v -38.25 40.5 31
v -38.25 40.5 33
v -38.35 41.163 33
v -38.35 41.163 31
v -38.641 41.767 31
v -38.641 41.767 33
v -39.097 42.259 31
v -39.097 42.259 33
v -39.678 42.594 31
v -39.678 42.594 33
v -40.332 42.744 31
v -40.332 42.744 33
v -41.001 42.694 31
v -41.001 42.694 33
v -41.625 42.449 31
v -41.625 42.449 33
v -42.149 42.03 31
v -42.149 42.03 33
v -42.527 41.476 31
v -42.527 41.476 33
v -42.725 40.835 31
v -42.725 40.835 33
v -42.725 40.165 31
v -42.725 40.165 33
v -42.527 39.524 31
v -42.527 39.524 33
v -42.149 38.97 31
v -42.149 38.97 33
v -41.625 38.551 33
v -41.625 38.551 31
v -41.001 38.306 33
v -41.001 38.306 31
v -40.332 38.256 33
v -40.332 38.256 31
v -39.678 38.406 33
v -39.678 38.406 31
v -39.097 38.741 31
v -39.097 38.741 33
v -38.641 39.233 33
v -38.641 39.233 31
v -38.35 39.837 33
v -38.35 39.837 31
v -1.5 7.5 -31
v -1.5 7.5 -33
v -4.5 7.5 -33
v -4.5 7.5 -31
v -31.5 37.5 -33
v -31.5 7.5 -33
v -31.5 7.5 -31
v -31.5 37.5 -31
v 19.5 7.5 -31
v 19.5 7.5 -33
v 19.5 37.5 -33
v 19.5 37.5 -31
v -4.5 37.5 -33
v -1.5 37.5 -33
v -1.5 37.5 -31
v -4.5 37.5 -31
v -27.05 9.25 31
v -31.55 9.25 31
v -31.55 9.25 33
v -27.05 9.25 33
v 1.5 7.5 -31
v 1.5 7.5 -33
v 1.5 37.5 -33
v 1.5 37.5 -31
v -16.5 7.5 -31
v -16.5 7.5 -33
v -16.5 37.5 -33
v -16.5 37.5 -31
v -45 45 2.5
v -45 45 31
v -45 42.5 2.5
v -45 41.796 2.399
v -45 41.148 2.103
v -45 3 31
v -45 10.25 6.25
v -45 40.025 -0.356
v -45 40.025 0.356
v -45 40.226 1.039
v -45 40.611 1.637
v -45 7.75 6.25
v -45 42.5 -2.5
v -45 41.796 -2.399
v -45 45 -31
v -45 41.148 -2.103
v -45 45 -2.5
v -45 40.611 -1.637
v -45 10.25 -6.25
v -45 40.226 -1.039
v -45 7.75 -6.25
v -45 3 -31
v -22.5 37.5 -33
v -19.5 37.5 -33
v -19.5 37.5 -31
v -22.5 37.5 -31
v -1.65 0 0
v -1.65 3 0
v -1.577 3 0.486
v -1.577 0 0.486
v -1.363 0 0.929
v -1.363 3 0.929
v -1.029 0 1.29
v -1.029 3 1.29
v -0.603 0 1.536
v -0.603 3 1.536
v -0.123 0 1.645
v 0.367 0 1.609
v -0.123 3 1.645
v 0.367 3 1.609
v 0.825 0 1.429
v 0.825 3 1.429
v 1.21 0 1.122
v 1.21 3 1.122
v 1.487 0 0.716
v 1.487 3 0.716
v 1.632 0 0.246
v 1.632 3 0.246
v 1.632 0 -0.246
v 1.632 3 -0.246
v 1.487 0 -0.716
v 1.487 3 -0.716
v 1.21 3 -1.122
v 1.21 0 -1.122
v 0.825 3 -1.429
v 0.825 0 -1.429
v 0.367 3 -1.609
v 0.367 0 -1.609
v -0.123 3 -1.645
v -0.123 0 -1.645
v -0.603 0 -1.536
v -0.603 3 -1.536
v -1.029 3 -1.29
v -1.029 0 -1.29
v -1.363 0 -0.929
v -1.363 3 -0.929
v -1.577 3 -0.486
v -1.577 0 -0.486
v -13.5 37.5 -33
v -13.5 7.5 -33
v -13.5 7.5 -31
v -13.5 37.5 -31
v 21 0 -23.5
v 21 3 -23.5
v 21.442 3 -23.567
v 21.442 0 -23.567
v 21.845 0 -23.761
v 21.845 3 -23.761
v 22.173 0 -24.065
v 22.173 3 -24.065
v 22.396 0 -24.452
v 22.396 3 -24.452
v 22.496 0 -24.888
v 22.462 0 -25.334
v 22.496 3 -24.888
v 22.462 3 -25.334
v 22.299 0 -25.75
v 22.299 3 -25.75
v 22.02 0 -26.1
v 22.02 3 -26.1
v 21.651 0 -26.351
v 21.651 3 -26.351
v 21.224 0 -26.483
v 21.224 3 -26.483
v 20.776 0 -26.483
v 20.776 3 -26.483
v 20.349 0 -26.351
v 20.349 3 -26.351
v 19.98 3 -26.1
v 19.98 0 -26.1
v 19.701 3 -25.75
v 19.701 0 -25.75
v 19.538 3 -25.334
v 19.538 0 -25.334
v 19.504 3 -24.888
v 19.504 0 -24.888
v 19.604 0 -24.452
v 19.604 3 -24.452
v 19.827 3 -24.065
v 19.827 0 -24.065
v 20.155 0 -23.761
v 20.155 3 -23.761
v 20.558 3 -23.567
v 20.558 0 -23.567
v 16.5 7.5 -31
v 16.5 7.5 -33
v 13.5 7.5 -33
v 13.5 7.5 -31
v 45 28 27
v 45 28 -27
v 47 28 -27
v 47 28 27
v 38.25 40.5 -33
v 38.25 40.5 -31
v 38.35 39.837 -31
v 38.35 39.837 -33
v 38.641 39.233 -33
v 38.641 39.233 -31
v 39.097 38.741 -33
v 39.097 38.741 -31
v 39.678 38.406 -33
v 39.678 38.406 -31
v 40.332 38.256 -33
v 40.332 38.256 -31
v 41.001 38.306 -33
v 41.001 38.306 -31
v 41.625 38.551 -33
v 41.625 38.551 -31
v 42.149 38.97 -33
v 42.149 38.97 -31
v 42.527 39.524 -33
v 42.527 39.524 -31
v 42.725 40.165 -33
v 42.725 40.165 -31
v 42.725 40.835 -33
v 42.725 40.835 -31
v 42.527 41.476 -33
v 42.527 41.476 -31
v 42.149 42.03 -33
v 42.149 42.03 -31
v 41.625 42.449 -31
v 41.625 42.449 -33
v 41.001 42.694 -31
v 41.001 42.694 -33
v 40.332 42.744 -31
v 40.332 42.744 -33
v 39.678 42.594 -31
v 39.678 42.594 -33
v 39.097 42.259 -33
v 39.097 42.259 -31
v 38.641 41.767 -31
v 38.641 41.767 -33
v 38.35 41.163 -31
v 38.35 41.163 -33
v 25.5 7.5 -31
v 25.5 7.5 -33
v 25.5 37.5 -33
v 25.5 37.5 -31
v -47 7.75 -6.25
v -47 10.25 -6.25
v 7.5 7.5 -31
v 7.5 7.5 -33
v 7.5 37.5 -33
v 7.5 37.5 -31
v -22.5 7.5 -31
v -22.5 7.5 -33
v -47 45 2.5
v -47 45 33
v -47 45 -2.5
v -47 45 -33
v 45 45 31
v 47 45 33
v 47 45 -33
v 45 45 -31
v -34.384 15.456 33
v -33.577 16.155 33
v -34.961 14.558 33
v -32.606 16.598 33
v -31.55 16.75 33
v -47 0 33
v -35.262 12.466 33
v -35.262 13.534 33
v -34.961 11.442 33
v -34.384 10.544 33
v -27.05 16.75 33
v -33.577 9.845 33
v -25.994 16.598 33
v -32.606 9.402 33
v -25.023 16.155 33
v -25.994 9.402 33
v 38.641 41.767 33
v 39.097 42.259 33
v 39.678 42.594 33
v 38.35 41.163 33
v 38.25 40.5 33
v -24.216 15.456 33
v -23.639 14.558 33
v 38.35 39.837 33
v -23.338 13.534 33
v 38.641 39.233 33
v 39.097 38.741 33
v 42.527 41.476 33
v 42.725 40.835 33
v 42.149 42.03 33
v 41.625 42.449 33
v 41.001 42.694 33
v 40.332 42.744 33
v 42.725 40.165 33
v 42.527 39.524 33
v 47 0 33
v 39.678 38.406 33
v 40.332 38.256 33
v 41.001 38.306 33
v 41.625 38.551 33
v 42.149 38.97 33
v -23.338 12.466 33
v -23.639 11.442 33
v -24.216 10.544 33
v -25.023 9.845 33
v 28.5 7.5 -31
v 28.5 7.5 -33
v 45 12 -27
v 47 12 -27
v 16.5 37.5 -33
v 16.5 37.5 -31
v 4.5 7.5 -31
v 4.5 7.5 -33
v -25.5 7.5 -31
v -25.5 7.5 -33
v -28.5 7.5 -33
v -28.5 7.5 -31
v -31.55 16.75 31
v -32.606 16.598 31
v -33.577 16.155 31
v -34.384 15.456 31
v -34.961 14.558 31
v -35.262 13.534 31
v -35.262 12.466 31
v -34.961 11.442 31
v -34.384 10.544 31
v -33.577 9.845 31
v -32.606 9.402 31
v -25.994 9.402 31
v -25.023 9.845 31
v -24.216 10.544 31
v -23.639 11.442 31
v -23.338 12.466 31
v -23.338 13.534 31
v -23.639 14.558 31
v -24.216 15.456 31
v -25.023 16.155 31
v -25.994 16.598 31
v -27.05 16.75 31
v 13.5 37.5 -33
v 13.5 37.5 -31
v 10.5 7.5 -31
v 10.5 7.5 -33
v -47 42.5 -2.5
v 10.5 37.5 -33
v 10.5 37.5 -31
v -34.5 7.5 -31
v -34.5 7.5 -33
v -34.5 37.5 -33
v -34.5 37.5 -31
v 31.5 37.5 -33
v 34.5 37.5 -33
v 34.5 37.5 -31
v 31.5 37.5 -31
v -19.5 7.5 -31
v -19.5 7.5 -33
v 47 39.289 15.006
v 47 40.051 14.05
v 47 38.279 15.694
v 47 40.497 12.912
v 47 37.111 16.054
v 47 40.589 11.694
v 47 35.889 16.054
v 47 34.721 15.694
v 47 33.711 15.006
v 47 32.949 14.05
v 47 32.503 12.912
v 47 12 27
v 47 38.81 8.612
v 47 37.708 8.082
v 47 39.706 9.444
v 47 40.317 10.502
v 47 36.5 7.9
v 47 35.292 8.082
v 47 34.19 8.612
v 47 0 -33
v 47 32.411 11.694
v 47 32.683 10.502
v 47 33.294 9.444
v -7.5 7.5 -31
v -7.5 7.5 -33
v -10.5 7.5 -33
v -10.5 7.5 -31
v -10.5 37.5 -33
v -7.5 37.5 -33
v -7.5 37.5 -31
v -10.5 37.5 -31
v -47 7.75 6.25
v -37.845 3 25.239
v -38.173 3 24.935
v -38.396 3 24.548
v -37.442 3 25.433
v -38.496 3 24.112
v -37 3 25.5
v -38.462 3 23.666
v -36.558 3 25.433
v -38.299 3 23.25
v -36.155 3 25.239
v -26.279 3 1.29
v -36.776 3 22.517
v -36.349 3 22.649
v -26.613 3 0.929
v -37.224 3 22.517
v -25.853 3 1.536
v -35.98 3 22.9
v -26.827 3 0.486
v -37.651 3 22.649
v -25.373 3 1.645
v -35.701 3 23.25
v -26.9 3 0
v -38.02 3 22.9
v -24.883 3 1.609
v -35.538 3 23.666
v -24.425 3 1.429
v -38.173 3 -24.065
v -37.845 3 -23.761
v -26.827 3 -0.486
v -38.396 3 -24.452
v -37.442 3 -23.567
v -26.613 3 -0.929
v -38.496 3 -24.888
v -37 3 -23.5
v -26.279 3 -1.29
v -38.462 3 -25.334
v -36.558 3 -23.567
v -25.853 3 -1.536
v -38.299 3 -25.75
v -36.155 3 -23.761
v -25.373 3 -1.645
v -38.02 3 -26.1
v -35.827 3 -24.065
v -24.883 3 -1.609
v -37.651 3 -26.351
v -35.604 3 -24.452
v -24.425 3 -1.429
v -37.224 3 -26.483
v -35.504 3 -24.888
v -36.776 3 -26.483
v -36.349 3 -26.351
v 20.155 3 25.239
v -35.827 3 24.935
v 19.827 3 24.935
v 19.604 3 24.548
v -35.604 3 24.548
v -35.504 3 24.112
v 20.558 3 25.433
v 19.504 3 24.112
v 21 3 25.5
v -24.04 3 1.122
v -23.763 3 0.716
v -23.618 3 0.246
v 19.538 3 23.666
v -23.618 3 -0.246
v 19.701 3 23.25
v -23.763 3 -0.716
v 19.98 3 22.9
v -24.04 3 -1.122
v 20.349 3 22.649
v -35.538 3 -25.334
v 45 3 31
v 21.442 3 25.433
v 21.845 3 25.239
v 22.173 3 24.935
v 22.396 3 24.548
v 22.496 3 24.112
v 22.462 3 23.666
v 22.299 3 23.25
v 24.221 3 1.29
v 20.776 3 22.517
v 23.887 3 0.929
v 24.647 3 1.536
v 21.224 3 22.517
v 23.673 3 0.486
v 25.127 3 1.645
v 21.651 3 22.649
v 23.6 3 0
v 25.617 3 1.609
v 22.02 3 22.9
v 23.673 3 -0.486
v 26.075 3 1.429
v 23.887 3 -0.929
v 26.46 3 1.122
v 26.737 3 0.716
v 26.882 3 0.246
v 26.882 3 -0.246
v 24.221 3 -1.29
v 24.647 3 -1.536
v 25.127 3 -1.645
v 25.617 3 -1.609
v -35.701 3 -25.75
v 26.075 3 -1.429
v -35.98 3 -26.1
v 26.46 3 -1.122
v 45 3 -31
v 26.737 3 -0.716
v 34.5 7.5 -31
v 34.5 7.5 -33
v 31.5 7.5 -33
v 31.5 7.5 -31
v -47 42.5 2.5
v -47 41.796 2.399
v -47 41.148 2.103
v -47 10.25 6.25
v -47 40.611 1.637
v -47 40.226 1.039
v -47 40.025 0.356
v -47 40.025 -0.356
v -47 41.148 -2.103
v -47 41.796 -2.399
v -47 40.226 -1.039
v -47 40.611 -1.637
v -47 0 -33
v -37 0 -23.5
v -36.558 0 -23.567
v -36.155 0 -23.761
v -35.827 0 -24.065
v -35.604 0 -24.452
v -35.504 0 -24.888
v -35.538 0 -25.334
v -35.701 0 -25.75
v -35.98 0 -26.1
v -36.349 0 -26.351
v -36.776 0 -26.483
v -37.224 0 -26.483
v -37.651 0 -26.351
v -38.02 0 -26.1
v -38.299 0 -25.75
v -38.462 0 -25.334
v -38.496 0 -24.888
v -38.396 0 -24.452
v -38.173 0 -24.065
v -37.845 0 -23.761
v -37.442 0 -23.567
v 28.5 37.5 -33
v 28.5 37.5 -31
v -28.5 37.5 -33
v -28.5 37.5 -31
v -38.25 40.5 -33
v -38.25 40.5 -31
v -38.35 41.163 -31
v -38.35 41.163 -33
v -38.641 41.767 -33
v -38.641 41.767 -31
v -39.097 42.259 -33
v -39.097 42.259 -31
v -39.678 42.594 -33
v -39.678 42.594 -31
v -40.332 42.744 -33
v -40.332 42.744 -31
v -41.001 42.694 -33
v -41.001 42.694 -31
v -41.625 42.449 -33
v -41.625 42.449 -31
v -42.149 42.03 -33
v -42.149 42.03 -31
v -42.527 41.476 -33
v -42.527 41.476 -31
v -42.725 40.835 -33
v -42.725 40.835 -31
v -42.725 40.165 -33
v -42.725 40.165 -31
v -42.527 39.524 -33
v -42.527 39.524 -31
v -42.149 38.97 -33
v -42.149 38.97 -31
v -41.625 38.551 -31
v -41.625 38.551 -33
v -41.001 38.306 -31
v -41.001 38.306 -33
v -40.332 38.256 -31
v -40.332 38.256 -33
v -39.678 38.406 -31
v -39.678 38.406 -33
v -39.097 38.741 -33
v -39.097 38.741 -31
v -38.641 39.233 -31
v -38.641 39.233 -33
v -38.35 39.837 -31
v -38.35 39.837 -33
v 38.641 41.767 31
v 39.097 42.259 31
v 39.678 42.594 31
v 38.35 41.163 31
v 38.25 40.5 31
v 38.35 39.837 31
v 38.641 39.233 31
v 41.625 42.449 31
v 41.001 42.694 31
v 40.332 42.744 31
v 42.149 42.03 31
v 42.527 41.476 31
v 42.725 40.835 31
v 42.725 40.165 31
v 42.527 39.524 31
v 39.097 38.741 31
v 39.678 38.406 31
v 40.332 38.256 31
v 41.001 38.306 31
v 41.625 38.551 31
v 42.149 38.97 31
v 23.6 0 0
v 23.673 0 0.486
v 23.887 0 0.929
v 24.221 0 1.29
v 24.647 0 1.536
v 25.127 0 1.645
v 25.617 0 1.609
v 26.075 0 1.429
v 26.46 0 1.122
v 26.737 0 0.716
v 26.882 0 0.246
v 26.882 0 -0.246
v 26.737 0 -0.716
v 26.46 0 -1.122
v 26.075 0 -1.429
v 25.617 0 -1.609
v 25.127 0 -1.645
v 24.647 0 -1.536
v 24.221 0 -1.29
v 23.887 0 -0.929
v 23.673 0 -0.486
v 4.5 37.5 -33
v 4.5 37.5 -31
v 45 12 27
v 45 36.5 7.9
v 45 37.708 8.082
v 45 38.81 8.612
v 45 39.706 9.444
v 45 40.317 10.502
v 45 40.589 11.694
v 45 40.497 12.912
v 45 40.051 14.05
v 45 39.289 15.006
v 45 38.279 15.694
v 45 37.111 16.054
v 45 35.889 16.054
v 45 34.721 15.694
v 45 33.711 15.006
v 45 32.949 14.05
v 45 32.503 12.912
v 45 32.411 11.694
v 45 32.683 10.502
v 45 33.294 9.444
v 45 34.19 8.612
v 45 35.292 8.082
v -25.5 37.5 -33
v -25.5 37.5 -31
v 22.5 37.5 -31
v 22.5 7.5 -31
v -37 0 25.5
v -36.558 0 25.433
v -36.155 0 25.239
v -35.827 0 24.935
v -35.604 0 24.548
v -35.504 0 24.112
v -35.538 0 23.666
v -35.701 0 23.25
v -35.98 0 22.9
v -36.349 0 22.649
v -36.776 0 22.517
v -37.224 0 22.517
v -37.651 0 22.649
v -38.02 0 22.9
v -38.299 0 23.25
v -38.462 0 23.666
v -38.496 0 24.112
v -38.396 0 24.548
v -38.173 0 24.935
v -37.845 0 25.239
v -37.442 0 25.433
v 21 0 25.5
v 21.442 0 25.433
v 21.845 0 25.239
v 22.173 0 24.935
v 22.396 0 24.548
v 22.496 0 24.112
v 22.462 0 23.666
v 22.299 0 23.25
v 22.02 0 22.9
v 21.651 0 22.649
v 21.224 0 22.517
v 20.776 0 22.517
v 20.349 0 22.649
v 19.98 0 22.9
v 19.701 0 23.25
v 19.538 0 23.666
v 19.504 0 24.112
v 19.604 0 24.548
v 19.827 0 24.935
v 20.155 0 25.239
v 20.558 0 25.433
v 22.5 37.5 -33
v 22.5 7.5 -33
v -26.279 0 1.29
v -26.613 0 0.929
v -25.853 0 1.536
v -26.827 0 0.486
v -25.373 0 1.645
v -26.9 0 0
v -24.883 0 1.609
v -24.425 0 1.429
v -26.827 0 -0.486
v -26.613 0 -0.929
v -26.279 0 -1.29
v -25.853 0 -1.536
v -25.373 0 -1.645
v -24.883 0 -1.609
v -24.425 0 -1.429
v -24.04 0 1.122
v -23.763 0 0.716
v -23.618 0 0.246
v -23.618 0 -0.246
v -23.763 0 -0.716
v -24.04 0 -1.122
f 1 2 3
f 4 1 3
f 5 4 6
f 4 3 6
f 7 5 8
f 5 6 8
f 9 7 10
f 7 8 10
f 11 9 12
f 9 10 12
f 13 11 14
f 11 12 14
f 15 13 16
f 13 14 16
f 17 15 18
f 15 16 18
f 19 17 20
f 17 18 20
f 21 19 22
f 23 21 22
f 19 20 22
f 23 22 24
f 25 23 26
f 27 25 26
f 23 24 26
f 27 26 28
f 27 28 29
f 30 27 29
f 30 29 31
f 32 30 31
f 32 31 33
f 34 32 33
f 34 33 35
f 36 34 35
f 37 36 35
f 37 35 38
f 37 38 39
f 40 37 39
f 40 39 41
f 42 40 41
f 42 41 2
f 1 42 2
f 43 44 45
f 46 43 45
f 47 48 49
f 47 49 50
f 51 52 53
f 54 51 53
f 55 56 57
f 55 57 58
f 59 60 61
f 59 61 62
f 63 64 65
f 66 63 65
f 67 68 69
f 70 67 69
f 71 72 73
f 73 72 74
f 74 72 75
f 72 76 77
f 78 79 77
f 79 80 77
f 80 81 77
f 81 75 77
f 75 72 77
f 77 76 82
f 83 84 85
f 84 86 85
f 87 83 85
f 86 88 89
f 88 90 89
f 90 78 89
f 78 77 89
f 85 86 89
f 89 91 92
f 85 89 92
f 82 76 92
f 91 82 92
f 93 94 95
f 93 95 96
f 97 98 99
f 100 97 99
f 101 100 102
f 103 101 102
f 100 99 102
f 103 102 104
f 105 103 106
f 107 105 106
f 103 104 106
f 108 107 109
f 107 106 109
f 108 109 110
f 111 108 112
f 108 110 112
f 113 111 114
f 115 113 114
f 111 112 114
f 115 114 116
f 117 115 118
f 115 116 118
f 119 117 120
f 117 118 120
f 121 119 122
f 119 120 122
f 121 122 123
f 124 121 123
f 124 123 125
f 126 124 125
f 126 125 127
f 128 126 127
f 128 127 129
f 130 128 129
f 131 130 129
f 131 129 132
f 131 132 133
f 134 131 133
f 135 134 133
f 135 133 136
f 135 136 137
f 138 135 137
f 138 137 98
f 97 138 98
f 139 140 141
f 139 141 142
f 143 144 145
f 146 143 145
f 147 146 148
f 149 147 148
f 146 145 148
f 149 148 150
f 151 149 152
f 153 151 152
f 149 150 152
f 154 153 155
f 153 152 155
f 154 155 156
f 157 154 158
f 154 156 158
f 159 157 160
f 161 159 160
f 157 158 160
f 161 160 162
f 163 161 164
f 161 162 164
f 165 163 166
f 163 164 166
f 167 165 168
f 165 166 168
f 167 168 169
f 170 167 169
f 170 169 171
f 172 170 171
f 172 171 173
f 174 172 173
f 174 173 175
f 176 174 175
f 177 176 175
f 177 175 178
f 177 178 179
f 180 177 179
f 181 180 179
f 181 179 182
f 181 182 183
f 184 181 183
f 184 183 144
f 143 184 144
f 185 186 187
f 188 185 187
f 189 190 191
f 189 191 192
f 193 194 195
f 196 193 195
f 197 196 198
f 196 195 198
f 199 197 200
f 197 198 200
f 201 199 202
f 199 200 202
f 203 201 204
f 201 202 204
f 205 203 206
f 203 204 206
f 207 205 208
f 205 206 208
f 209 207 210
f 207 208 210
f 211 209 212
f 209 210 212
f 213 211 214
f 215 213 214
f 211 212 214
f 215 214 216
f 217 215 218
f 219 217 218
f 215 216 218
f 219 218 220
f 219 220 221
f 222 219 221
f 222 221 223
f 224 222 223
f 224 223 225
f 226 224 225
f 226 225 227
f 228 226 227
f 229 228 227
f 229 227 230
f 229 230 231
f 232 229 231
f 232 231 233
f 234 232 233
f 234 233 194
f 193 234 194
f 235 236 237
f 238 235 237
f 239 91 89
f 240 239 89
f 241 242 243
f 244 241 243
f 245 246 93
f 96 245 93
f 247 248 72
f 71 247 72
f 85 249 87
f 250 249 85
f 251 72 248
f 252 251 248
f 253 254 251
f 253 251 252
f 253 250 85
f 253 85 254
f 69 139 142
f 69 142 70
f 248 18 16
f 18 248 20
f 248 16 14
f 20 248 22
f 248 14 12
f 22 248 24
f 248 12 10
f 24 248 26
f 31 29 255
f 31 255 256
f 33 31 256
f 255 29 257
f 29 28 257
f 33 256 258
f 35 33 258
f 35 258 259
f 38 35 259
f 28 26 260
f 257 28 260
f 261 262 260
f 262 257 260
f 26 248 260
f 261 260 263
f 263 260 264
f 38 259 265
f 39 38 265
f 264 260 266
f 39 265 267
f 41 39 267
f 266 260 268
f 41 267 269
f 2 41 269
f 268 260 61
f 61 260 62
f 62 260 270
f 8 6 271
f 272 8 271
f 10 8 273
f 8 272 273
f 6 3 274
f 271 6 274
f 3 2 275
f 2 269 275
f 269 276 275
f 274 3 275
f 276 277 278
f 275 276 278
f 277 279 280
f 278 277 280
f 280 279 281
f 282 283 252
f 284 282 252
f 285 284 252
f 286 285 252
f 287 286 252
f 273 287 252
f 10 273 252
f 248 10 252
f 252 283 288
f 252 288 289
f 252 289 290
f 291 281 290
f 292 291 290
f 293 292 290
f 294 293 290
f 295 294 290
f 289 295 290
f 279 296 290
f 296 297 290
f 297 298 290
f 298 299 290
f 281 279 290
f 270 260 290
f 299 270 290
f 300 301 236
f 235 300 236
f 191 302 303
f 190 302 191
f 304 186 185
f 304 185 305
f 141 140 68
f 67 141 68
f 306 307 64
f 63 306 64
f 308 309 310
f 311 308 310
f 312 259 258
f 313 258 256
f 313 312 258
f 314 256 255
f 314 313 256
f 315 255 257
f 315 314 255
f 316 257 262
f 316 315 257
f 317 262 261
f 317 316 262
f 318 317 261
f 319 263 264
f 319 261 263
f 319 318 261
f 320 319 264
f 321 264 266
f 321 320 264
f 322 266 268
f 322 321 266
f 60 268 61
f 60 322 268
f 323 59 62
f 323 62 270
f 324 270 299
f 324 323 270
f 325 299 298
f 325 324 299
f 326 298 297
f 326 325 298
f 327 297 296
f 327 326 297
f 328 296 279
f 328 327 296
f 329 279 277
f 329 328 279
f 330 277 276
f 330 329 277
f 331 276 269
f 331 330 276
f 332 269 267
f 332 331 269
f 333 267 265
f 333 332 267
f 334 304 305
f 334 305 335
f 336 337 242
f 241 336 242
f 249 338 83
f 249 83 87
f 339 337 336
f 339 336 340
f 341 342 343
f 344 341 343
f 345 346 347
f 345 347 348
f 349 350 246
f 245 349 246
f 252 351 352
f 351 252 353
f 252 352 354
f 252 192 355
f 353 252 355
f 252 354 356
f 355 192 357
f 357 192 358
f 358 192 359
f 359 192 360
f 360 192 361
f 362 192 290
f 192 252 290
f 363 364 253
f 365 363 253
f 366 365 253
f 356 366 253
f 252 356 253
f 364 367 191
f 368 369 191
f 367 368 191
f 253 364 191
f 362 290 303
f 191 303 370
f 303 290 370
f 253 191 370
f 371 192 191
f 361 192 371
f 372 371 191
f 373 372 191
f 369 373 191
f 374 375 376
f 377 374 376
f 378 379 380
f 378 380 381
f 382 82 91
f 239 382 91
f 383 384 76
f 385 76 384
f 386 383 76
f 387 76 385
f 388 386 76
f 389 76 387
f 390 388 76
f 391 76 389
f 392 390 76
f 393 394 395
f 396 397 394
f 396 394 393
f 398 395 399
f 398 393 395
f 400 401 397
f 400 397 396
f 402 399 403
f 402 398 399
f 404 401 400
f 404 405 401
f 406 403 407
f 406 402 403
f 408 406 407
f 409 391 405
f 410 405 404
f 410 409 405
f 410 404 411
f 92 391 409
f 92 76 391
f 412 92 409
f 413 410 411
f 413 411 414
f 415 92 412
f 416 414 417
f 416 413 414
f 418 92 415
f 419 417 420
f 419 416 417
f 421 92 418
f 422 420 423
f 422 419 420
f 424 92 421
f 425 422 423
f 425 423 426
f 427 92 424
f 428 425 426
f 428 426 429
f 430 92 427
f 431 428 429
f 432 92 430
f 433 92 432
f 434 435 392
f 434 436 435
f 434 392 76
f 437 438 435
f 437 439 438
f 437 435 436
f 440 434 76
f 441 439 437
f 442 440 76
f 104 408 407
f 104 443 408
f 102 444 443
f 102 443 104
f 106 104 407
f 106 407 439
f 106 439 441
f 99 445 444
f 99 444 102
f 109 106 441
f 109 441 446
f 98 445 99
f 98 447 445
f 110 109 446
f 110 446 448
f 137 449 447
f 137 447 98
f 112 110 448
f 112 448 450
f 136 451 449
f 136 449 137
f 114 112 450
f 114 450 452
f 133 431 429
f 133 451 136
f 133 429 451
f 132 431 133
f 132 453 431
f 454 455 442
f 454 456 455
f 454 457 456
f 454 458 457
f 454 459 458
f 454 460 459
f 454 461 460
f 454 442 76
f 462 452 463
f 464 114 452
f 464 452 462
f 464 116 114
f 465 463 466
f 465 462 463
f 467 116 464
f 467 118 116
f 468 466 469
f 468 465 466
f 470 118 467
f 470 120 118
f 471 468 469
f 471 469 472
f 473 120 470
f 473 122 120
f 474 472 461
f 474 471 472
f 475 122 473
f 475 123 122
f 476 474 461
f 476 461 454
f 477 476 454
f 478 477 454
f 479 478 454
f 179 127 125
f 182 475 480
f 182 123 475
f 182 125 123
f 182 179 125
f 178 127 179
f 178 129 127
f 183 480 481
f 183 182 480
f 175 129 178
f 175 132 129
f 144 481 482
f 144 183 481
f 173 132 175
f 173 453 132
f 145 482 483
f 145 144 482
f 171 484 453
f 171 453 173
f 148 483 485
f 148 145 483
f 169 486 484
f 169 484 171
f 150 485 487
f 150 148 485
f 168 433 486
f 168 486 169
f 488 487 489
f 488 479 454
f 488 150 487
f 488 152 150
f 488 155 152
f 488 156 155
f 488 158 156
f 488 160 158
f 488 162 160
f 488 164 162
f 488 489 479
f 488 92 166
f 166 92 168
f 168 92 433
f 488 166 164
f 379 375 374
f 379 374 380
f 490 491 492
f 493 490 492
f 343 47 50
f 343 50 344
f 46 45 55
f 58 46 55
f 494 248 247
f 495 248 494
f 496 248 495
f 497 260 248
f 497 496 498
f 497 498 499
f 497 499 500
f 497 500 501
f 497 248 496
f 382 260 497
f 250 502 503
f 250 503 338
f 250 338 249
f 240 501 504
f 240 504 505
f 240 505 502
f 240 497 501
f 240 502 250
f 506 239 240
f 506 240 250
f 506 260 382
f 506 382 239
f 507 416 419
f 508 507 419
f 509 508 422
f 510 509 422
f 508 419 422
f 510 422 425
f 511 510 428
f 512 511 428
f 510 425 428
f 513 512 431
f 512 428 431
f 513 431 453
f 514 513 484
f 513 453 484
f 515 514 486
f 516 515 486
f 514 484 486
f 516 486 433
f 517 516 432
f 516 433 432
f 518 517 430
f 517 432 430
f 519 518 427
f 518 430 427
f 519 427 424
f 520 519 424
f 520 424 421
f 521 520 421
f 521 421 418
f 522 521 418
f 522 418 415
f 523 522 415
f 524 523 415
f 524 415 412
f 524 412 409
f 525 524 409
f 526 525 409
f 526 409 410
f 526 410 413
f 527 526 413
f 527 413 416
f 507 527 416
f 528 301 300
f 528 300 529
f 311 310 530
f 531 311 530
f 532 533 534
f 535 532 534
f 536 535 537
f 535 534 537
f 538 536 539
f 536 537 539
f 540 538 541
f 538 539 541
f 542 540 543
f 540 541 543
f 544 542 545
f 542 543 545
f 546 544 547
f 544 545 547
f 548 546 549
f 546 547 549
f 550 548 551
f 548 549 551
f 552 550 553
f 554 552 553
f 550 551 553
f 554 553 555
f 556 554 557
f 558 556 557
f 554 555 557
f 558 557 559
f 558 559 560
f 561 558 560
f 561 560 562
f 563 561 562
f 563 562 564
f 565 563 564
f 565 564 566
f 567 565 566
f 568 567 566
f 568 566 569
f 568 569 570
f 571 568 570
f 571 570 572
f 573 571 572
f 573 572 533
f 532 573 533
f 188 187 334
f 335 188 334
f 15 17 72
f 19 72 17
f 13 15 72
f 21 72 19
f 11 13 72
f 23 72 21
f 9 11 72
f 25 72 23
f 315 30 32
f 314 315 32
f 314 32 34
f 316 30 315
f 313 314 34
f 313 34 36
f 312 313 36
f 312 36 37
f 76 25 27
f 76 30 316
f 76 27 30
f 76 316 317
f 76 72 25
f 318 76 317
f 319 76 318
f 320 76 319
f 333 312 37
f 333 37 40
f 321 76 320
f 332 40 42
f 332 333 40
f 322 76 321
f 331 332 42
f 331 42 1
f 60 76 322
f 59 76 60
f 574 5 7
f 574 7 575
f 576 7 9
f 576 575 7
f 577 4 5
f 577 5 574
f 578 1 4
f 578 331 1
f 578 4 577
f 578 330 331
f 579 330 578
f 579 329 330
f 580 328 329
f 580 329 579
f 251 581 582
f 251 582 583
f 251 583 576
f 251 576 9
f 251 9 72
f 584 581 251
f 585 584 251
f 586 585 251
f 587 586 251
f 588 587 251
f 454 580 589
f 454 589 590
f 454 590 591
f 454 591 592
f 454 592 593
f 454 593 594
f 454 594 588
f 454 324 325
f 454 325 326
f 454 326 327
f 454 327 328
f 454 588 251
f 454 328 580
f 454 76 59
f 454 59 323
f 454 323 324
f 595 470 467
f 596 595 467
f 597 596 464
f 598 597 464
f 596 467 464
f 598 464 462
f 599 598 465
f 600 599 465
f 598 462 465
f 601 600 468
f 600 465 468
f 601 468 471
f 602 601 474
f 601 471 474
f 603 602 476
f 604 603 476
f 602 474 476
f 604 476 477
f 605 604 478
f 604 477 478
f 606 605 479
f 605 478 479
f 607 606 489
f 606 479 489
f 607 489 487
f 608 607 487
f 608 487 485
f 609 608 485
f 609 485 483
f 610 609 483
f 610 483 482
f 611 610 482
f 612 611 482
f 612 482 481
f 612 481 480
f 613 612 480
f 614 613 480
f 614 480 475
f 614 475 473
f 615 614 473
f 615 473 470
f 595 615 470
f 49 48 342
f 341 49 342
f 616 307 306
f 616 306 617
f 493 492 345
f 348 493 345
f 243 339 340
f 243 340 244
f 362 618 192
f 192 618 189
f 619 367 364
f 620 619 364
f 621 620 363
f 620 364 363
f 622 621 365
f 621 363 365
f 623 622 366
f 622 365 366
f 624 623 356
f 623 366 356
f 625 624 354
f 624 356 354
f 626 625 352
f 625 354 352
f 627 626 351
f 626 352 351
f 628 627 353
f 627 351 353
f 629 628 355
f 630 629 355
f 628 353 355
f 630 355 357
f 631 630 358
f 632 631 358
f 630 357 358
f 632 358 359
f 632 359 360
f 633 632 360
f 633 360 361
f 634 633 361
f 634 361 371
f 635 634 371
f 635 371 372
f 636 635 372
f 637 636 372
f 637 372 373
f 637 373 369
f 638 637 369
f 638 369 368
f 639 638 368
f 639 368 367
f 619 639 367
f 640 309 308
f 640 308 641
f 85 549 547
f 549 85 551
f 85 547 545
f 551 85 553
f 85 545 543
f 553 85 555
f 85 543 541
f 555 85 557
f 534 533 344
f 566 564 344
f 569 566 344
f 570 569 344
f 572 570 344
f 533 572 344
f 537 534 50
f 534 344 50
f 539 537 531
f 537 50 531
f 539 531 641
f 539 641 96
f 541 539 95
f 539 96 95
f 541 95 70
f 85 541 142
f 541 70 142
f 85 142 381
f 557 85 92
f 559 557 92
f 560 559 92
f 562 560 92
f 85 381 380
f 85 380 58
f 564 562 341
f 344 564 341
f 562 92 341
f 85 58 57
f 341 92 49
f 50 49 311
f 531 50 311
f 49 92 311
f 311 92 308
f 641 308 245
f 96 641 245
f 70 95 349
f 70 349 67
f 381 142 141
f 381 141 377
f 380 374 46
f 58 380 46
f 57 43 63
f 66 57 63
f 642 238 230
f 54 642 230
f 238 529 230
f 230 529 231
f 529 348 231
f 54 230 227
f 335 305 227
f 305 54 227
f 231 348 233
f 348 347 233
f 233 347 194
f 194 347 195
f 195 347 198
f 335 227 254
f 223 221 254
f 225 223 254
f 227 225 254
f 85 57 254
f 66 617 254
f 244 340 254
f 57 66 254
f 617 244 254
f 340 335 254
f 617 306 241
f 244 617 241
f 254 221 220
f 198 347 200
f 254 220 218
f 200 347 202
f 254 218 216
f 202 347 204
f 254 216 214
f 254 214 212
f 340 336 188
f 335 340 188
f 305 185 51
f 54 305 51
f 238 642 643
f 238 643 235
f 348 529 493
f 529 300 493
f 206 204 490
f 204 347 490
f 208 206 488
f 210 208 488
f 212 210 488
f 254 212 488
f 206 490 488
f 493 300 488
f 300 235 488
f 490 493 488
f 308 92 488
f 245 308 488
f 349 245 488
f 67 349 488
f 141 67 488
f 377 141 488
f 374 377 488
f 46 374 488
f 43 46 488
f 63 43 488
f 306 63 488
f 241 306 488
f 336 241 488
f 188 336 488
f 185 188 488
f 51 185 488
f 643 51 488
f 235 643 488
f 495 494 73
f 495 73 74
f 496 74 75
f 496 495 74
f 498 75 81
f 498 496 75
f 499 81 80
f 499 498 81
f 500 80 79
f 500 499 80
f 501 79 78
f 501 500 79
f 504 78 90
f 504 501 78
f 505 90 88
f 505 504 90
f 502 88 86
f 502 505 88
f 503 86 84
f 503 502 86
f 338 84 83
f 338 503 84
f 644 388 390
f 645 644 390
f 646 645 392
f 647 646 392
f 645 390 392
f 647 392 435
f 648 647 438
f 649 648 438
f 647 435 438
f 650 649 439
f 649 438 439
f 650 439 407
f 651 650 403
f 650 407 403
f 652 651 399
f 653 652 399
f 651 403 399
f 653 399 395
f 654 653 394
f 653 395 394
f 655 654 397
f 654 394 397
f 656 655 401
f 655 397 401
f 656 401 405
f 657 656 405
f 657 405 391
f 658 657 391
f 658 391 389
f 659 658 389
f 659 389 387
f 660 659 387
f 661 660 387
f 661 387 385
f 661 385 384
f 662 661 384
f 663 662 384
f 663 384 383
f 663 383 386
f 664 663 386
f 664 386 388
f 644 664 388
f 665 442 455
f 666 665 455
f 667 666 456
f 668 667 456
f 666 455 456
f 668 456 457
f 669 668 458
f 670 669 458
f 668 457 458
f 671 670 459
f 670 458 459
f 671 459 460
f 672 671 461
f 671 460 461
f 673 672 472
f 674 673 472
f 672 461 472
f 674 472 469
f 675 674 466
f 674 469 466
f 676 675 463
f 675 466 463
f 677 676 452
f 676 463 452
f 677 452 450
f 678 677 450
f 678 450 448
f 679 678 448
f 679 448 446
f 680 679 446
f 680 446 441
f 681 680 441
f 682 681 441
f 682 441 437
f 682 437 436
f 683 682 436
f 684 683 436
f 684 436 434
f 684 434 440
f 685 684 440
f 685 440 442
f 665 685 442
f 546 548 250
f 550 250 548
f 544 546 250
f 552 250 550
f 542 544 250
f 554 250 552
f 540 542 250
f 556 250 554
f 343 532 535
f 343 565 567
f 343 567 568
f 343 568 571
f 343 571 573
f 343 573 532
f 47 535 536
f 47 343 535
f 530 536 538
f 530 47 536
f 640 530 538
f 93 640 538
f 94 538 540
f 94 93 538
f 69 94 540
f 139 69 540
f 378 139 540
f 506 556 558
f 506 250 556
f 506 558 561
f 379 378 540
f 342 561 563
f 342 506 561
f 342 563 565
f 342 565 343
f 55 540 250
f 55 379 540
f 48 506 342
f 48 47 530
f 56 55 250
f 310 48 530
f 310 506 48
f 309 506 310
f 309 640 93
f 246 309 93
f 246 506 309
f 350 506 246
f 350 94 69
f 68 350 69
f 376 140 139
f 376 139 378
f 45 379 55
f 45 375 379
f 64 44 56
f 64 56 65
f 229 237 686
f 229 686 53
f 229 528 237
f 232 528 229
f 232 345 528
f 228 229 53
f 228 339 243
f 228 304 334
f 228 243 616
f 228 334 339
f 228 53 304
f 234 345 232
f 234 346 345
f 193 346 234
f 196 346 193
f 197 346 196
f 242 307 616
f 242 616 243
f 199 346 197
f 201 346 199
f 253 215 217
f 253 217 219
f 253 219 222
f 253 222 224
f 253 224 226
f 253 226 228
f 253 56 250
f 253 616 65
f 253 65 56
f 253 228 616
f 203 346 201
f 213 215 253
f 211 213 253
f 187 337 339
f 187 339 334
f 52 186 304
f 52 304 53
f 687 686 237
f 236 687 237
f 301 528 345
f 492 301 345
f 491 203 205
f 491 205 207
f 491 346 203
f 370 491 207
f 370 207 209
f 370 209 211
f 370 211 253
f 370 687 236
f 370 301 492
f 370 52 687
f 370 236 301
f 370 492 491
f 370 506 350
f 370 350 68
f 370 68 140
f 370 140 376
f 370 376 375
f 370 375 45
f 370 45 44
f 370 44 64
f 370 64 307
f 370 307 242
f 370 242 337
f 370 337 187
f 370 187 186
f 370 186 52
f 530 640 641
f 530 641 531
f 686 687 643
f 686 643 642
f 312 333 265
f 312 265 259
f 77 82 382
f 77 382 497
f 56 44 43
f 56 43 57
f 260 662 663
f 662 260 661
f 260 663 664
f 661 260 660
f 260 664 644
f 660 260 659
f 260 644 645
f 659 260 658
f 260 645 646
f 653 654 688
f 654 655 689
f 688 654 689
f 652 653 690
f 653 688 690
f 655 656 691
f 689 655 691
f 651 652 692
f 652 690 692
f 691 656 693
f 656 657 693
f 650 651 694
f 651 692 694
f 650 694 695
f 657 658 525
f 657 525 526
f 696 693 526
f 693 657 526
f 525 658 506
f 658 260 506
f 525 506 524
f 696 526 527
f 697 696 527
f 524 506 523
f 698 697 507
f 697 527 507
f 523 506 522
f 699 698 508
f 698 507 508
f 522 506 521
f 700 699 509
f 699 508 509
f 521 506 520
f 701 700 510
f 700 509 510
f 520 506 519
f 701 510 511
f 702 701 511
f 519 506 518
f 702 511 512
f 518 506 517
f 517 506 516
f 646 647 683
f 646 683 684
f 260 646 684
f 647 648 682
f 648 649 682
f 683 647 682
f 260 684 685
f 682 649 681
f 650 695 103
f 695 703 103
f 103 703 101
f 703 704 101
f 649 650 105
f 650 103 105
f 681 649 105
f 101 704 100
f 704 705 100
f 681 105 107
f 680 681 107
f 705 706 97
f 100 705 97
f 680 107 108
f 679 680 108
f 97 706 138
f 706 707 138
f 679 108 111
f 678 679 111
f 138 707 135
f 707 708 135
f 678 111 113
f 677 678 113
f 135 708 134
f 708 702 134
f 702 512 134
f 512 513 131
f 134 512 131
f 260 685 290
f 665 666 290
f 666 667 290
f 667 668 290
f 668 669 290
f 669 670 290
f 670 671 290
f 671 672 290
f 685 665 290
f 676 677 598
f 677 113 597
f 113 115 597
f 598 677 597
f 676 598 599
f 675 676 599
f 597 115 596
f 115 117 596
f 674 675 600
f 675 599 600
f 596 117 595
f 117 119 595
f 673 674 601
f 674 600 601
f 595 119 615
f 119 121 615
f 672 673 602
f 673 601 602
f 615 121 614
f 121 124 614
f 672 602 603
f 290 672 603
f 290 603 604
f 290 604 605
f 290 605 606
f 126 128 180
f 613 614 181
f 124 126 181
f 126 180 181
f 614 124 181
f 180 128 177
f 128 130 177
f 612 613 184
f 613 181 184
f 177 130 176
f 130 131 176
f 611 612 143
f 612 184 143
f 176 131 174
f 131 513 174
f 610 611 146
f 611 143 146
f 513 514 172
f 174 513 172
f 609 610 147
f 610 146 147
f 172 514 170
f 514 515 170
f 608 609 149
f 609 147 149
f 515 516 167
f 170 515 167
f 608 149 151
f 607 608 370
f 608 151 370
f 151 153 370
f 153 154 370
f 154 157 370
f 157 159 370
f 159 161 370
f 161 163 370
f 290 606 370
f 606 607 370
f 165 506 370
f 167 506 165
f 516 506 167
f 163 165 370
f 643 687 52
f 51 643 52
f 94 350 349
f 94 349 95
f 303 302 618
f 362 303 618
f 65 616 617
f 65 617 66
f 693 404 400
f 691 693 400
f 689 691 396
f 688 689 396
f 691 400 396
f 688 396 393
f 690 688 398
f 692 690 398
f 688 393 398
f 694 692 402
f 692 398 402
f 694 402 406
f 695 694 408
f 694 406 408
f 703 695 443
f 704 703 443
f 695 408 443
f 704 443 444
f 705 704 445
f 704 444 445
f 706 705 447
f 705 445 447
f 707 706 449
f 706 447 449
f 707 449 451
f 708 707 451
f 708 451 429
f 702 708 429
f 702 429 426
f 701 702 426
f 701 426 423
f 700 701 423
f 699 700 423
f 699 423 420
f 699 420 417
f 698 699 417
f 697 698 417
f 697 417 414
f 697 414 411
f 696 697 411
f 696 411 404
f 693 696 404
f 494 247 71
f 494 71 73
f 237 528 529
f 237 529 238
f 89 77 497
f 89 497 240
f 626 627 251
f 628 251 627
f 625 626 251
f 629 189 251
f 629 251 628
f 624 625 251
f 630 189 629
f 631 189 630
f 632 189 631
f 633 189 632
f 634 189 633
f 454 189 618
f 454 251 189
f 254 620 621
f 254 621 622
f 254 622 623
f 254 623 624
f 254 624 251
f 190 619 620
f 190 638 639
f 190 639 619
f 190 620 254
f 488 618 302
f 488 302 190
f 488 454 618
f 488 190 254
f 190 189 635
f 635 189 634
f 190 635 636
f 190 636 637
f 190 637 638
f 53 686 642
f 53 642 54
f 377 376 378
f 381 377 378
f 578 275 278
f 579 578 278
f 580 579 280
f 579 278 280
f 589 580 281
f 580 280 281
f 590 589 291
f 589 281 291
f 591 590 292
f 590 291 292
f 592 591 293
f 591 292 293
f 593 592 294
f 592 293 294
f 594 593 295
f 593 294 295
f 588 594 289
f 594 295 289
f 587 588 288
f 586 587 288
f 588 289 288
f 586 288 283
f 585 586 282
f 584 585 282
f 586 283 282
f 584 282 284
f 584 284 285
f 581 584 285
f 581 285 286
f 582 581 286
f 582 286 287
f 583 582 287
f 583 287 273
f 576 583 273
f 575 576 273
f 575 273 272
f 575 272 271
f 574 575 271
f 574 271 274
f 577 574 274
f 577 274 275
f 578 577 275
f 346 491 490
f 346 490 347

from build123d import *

# Parameters (mm, degrees)
SKETCH1_W           = 90
SKETCH1_H           = 62
BOSS_EXTRUDE1_DEPTH = 3
CUT_EXTRUDE1_REACH  = 56.727
SKETCH2_R           = 1.5
SKETCH3_W           = 94
SKETCH3_H           = 66
SKETCH3_W_2         = 90
SKETCH3_H_2         = 62
BOSS_EXTRUDE2_DEPTH = 45
CUT_EXTRUDE2_REACH  = 109.601
SKETCH4_W           = 12.5
SKETCH4_H           = 2.5
CUT_EXTRUDE3_REACH  = 93.269
CUT_EXTRUDE4_REACH  = 109.601
SKETCH6_W           = 54
SKETCH6_H           = 16
CUT_EXTRUDE5_REACH  = 111.316
SKETCH7_R           = 4.1
SKETCH8_R           = 2.25
CUT_EXTRUDE6_DEPTH  = 93.682252886
CUT_EXTRUDE7_DEPTH  = 72.147733625
CUT_EXTRUDE8_REACH  = 94.682
SKETCH10_W          = 3
SKETCH10_H          = 30
CUT_EXTRUDE9_REACH  = 111.316


with BuildPart() as part:
    # Sketch1 → Boss-Extrude1 (new body)
    with BuildSketch(Plane(origin=(0, 0, 0), x_dir=(1, 0, 0), z_dir=(0, 1, 0))):
        Rectangle(SKETCH1_W, SKETCH1_H)
    extrude(amount=BOSS_EXTRUDE1_DEPTH)

    # Sketch2 → Cut-Extrude1 (cut, up to next)
    with BuildSketch(Plane(origin=(0, 3, 0), x_dir=(1, 0, 0), z_dir=(0, 1, 0)), mode=Mode.PRIVATE) as cut_extrude1_sk1:
        with Locations(Location((-37, -24, 0), (0, 0, 270))):
            Circle(SKETCH2_R)
    cut_extrude1_tool1 = extrude(cut_extrude1_sk1.sketch, amount=-CUT_EXTRUDE1_REACH, mode=Mode.PRIVATE) & part.part
    # Sketch2 → Cut-Extrude1 (cut, up to next)
    with BuildSketch(Plane(origin=(0, 3, 0), x_dir=(1, 0, 0), z_dir=(0, 1, 0)), mode=Mode.PRIVATE) as cut_extrude1_sk2:
        with Locations(Location((21, -24, 0), (0, 0, 270))):
            Circle(SKETCH2_R)
    cut_extrude1_tool2 = extrude(cut_extrude1_sk2.sketch, amount=-CUT_EXTRUDE1_REACH, mode=Mode.PRIVATE) & part.part
    # Sketch2 → Cut-Extrude1 (cut, up to next)
    with BuildSketch(Plane(origin=(0, 3, 0), x_dir=(1, 0, 0), z_dir=(0, 1, 0)), mode=Mode.PRIVATE) as cut_extrude1_sk3:
        with Locations(Location((21, 25, 0), (0, 0, 270))):
            Circle(SKETCH2_R)
    cut_extrude1_tool3 = extrude(cut_extrude1_sk3.sketch, amount=-CUT_EXTRUDE1_REACH, mode=Mode.PRIVATE) & part.part
    # Sketch2 → Cut-Extrude1 (cut, up to next)
    with BuildSketch(Plane(origin=(0, 3, 0), x_dir=(1, 0, 0), z_dir=(0, 1, 0)), mode=Mode.PRIVATE) as cut_extrude1_sk4:
        with Locations(Location((-37, 25, 0), (0, 0, 270))):
            Circle(SKETCH2_R)
    cut_extrude1_tool4 = extrude(cut_extrude1_sk4.sketch, amount=-CUT_EXTRUDE1_REACH, mode=Mode.PRIVATE) & part.part
    add(cut_extrude1_tool1.solids().sort_by_distance((-37, 3, 24))[0], mode=Mode.SUBTRACT)
    add(cut_extrude1_tool2.solids().sort_by_distance((21, 3, 24))[0], mode=Mode.SUBTRACT)
    add(cut_extrude1_tool3.solids().sort_by_distance((21, 3, -25))[0], mode=Mode.SUBTRACT)
    add(cut_extrude1_tool4.solids().sort_by_distance((-37, 3, -25))[0], mode=Mode.SUBTRACT)

    # Sketch3 → Boss-Extrude2 (add)
    with BuildSketch(Plane(origin=(0, 0, 0), x_dir=(1, 0, 0), z_dir=(0, 1, 0))):
        Rectangle(SKETCH3_W, SKETCH3_H)
        Rectangle(SKETCH3_W_2, SKETCH3_H_2, mode=Mode.SUBTRACT)
    extrude(amount=BOSS_EXTRUDE2_DEPTH)

    # Sketch4 → Cut-Extrude2 (cut, up to next)
    with BuildSketch(Plane(origin=(-45, 0, 0), x_dir=(0, 0, -1), z_dir=(1, 0, 0)), mode=Mode.PRIVATE) as cut_extrude2_sk1:
        with Locations((0, 9)):
            Rectangle(SKETCH4_W, SKETCH4_H)
    cut_extrude2_tool1 = extrude(cut_extrude2_sk1.sketch, amount=-CUT_EXTRUDE2_REACH, mode=Mode.PRIVATE) & part.part
    add(cut_extrude2_tool1.solids().sort_by_distance((-45, 9, 0))[0], mode=Mode.SUBTRACT)

    # Sketch5 → Cut-Extrude3 (cut, up to next)
    with BuildSketch(Plane(origin=(0, 0, 31), x_dir=(-1, 0, 0), z_dir=(0, 0, -1)), mode=Mode.PRIVATE) as cut_extrude3_sk1:
        with BuildLine():
            Line((31.55, 9.25), (27.05, 9.25))
            ThreePointArc((27.05, 9.25), (23.3, 13), (27.05, 16.75))
            Line((27.05, 16.75), (31.55, 16.75))
            ThreePointArc((31.55, 16.75), (35.3, 13), (31.55, 9.25))
        make_face()
    cut_extrude3_tool1 = extrude(cut_extrude3_sk1.sketch, amount=-CUT_EXTRUDE3_REACH, mode=Mode.PRIVATE) & part.part
    add(cut_extrude3_tool1.solids().sort_by_distance((-29.3, 13, 31))[0], mode=Mode.SUBTRACT)

    # Sketch6 → Cut-Extrude4 (cut, up to next)
    with BuildSketch(Plane.ZY.offset(-45), mode=Mode.PRIVATE) as cut_extrude4_sk1:
        with Locations((0, 20)):
            Rectangle(SKETCH6_W, SKETCH6_H)
    cut_extrude4_tool1 = extrude(cut_extrude4_sk1.sketch, amount=-CUT_EXTRUDE4_REACH, mode=Mode.PRIVATE) & part.part
    add(cut_extrude4_tool1.solids().sort_by_distance((45, 20, 0))[0], mode=Mode.SUBTRACT)

    # Sketch7 → Cut-Extrude5 (cut, up to next)
    with BuildSketch(Plane(origin=(47, 0, 0), x_dir=(0, 0, -1), z_dir=(1, 0, 0)), mode=Mode.PRIVATE) as cut_extrude5_sk1:
        with Locations((-12, 36.5)):
            Circle(SKETCH7_R)
    cut_extrude5_tool1 = extrude(cut_extrude5_sk1.sketch, amount=-CUT_EXTRUDE5_REACH, mode=Mode.PRIVATE) & part.part
    add(cut_extrude5_tool1.solids().sort_by_distance((47, 36.5, 12))[0], mode=Mode.SUBTRACT)

    # Sketch8 → Cut-Extrude6 (cut, through all)
    with BuildSketch(Plane.XY.offset(33)):
        with Locations((-40.5, 40.5)):
            Circle(SKETCH8_R)
        with Locations(Location((40.5, 40.5, 0), (0, 0, 180))):
            Circle(SKETCH8_R)
    extrude(amount=-CUT_EXTRUDE6_DEPTH, mode=Mode.SUBTRACT)

    # Sketch9 → Cut-Extrude7 (cut, through all)
    with BuildSketch(Plane(origin=(0, 3, 0), x_dir=(1, 0, 0), z_dir=(0, 1, 0))):
        with BuildLine():
            ThreePointArc((-23.6, 0), (-25.25, 1.65), (-26.9, 0))
            Line((-26.9, 0), (-23.6, 0))
        make_face()
        with BuildLine():
            Line((-23.6, 0), (-26.9, 0))
            ThreePointArc((-26.9, 0), (-25.25, -1.65), (-23.6, 0))
        make_face()
        with BuildLine():
            ThreePointArc((1.65, 0), (0, 1.65), (-1.65, 0))
            Line((-1.65, 0), (1.65, 0))
        make_face()
        with BuildLine():
            Line((1.65, 0), (-1.65, 0))
            ThreePointArc((-1.65, 0), (0, -1.65), (1.65, 0))
        make_face()
        with BuildLine():
            ThreePointArc((26.9, 0), (25.25, 1.65), (23.6, 0))
            Line((23.6, 0), (26.9, 0))
        make_face()
        with BuildLine():
            Line((26.9, 0), (23.6, 0))
            ThreePointArc((23.6, 0), (25.25, -1.65), (26.9, 0))
        make_face()
    extrude(amount=-CUT_EXTRUDE7_DEPTH, mode=Mode.SUBTRACT)

    # Sketch10 → Cut-Extrude8 (cut, up to next)
    with BuildSketch(Plane(origin=(0, 0, -33), x_dir=(-1, 0, 0), z_dir=(0, 0, -1)), mode=Mode.PRIVATE) as cut_extrude8_sk1:
        with Locations((9, 22.5)):
            Rectangle(SKETCH10_W, SKETCH10_H)
    cut_extrude8_tool1 = extrude(cut_extrude8_sk1.sketch, amount=-CUT_EXTRUDE8_REACH, mode=Mode.PRIVATE) & part.part
    # Sketch10 → Cut-Extrude8 (cut, up to next)
    with BuildSketch(Plane(origin=(0, 0, -33), x_dir=(-1, 0, 0), z_dir=(0, 0, -1)), mode=Mode.PRIVATE) as cut_extrude8_sk2:
        with Locations((3, 22.5)):
            Rectangle(SKETCH10_W, SKETCH10_H)
    cut_extrude8_tool2 = extrude(cut_extrude8_sk2.sketch, amount=-CUT_EXTRUDE8_REACH, mode=Mode.PRIVATE) & part.part
    # Sketch10 → Cut-Extrude8 (cut, up to next)
    with BuildSketch(Plane(origin=(0, 0, -33), x_dir=(-1, 0, 0), z_dir=(0, 0, -1)), mode=Mode.PRIVATE) as cut_extrude8_sk3:
        with Locations((15, 22.5)):
            Rectangle(SKETCH10_W, SKETCH10_H)
    cut_extrude8_tool3 = extrude(cut_extrude8_sk3.sketch, amount=-CUT_EXTRUDE8_REACH, mode=Mode.PRIVATE) & part.part
    # Sketch10 → Cut-Extrude8 (cut, up to next)
    with BuildSketch(Plane(origin=(0, 0, -33), x_dir=(-1, 0, 0), z_dir=(0, 0, -1)), mode=Mode.PRIVATE) as cut_extrude8_sk4:
        with Locations((21, 22.5)):
            Rectangle(SKETCH10_W, SKETCH10_H)
    cut_extrude8_tool4 = extrude(cut_extrude8_sk4.sketch, amount=-CUT_EXTRUDE8_REACH, mode=Mode.PRIVATE) & part.part
    # Sketch10 → Cut-Extrude8 (cut, up to next)
    with BuildSketch(Plane(origin=(0, 0, -33), x_dir=(-1, 0, 0), z_dir=(0, 0, -1)), mode=Mode.PRIVATE) as cut_extrude8_sk5:
        with Locations((27, 22.5)):
            Rectangle(SKETCH10_W, SKETCH10_H)
    cut_extrude8_tool5 = extrude(cut_extrude8_sk5.sketch, amount=-CUT_EXTRUDE8_REACH, mode=Mode.PRIVATE) & part.part
    # Sketch10 → Cut-Extrude8 (cut, up to next)
    with BuildSketch(Plane(origin=(0, 0, -33), x_dir=(-1, 0, 0), z_dir=(0, 0, -1)), mode=Mode.PRIVATE) as cut_extrude8_sk6:
        with Locations((33, 22.5)):
            Rectangle(SKETCH10_W, SKETCH10_H)
    cut_extrude8_tool6 = extrude(cut_extrude8_sk6.sketch, amount=-CUT_EXTRUDE8_REACH, mode=Mode.PRIVATE) & part.part
    # Sketch10 → Cut-Extrude8 (cut, up to next)
    with BuildSketch(Plane(origin=(0, 0, -33), x_dir=(-1, 0, 0), z_dir=(0, 0, -1)), mode=Mode.PRIVATE) as cut_extrude8_sk7:
        with Locations((-3, 22.5)):
            Rectangle(SKETCH10_W, SKETCH10_H)
    cut_extrude8_tool7 = extrude(cut_extrude8_sk7.sketch, amount=-CUT_EXTRUDE8_REACH, mode=Mode.PRIVATE) & part.part
    # Sketch10 → Cut-Extrude8 (cut, up to next)
    with BuildSketch(Plane(origin=(0, 0, -33), x_dir=(-1, 0, 0), z_dir=(0, 0, -1)), mode=Mode.PRIVATE) as cut_extrude8_sk8:
        with Locations((-9, 22.5)):
            Rectangle(SKETCH10_W, SKETCH10_H)
    cut_extrude8_tool8 = extrude(cut_extrude8_sk8.sketch, amount=-CUT_EXTRUDE8_REACH, mode=Mode.PRIVATE) & part.part
    # Sketch10 → Cut-Extrude8 (cut, up to next)
    with BuildSketch(Plane(origin=(0, 0, -33), x_dir=(-1, 0, 0), z_dir=(0, 0, -1)), mode=Mode.PRIVATE) as cut_extrude8_sk9:
        with Locations((-15, 22.5)):
            Rectangle(SKETCH10_W, SKETCH10_H)
    cut_extrude8_tool9 = extrude(cut_extrude8_sk9.sketch, amount=-CUT_EXTRUDE8_REACH, mode=Mode.PRIVATE) & part.part
    # Sketch10 → Cut-Extrude8 (cut, up to next)
    with BuildSketch(Plane(origin=(0, 0, -33), x_dir=(-1, 0, 0), z_dir=(0, 0, -1)), mode=Mode.PRIVATE) as cut_extrude8_sk10:
        with Locations((-21, 22.5)):
            Rectangle(SKETCH10_W, SKETCH10_H)
    cut_extrude8_tool10 = extrude(cut_extrude8_sk10.sketch, amount=-CUT_EXTRUDE8_REACH, mode=Mode.PRIVATE) & part.part
    # Sketch10 → Cut-Extrude8 (cut, up to next)
    with BuildSketch(Plane(origin=(0, 0, -33), x_dir=(-1, 0, 0), z_dir=(0, 0, -1)), mode=Mode.PRIVATE) as cut_extrude8_sk11:
        with Locations((-27, 22.5)):
            Rectangle(SKETCH10_W, SKETCH10_H)
    cut_extrude8_tool11 = extrude(cut_extrude8_sk11.sketch, amount=-CUT_EXTRUDE8_REACH, mode=Mode.PRIVATE) & part.part
    # Sketch10 → Cut-Extrude8 (cut, up to next)
    with BuildSketch(Plane(origin=(0, 0, -33), x_dir=(-1, 0, 0), z_dir=(0, 0, -1)), mode=Mode.PRIVATE) as cut_extrude8_sk12:
        with Locations((-33, 22.5)):
            Rectangle(SKETCH10_W, SKETCH10_H)
    cut_extrude8_tool12 = extrude(cut_extrude8_sk12.sketch, amount=-CUT_EXTRUDE8_REACH, mode=Mode.PRIVATE) & part.part
    add(cut_extrude8_tool1.solids().sort_by_distance((-9, 22.5, -33))[0], mode=Mode.SUBTRACT)
    add(cut_extrude8_tool2.solids().sort_by_distance((-3, 22.5, -33))[0], mode=Mode.SUBTRACT)
    add(cut_extrude8_tool3.solids().sort_by_distance((-15, 22.5, -33))[0], mode=Mode.SUBTRACT)
    add(cut_extrude8_tool4.solids().sort_by_distance((-21, 22.5, -33))[0], mode=Mode.SUBTRACT)
    add(cut_extrude8_tool5.solids().sort_by_distance((-27, 22.5, -33))[0], mode=Mode.SUBTRACT)
    add(cut_extrude8_tool6.solids().sort_by_distance((-33, 22.5, -33))[0], mode=Mode.SUBTRACT)
    add(cut_extrude8_tool7.solids().sort_by_distance((3, 22.5, -33))[0], mode=Mode.SUBTRACT)
    add(cut_extrude8_tool8.solids().sort_by_distance((9, 22.5, -33))[0], mode=Mode.SUBTRACT)
    add(cut_extrude8_tool9.solids().sort_by_distance((15, 22.5, -33))[0], mode=Mode.SUBTRACT)
    add(cut_extrude8_tool10.solids().sort_by_distance((21, 22.5, -33))[0], mode=Mode.SUBTRACT)
    add(cut_extrude8_tool11.solids().sort_by_distance((27, 22.5, -33))[0], mode=Mode.SUBTRACT)
    add(cut_extrude8_tool12.solids().sort_by_distance((33, 22.5, -33))[0], mode=Mode.SUBTRACT)

    # Sketch11 → Cut-Extrude9 (cut, up to next)
    with BuildSketch(Plane.ZY.offset(47), mode=Mode.PRIVATE) as cut_extrude9_sk1:
        with BuildLine():
            Line((2.5, 47.5), (2.5, 42.5))
            ThreePointArc((2.5, 42.5), (0, 40), (-2.5, 42.5))
            Line((-2.5, 42.5), (-2.5, 47.5))
            ThreePointArc((-2.5, 47.5), (0, 50), (2.5, 47.5))
        make_face()
    cut_extrude9_tool1 = extrude(cut_extrude9_sk1.sketch, amount=-CUT_EXTRUDE9_REACH, mode=Mode.PRIVATE) & part.part
    add(cut_extrude9_tool1.solids().sort_by_distance((-47, 45, 0))[0], mode=Mode.SUBTRACT)


solid = part.part
